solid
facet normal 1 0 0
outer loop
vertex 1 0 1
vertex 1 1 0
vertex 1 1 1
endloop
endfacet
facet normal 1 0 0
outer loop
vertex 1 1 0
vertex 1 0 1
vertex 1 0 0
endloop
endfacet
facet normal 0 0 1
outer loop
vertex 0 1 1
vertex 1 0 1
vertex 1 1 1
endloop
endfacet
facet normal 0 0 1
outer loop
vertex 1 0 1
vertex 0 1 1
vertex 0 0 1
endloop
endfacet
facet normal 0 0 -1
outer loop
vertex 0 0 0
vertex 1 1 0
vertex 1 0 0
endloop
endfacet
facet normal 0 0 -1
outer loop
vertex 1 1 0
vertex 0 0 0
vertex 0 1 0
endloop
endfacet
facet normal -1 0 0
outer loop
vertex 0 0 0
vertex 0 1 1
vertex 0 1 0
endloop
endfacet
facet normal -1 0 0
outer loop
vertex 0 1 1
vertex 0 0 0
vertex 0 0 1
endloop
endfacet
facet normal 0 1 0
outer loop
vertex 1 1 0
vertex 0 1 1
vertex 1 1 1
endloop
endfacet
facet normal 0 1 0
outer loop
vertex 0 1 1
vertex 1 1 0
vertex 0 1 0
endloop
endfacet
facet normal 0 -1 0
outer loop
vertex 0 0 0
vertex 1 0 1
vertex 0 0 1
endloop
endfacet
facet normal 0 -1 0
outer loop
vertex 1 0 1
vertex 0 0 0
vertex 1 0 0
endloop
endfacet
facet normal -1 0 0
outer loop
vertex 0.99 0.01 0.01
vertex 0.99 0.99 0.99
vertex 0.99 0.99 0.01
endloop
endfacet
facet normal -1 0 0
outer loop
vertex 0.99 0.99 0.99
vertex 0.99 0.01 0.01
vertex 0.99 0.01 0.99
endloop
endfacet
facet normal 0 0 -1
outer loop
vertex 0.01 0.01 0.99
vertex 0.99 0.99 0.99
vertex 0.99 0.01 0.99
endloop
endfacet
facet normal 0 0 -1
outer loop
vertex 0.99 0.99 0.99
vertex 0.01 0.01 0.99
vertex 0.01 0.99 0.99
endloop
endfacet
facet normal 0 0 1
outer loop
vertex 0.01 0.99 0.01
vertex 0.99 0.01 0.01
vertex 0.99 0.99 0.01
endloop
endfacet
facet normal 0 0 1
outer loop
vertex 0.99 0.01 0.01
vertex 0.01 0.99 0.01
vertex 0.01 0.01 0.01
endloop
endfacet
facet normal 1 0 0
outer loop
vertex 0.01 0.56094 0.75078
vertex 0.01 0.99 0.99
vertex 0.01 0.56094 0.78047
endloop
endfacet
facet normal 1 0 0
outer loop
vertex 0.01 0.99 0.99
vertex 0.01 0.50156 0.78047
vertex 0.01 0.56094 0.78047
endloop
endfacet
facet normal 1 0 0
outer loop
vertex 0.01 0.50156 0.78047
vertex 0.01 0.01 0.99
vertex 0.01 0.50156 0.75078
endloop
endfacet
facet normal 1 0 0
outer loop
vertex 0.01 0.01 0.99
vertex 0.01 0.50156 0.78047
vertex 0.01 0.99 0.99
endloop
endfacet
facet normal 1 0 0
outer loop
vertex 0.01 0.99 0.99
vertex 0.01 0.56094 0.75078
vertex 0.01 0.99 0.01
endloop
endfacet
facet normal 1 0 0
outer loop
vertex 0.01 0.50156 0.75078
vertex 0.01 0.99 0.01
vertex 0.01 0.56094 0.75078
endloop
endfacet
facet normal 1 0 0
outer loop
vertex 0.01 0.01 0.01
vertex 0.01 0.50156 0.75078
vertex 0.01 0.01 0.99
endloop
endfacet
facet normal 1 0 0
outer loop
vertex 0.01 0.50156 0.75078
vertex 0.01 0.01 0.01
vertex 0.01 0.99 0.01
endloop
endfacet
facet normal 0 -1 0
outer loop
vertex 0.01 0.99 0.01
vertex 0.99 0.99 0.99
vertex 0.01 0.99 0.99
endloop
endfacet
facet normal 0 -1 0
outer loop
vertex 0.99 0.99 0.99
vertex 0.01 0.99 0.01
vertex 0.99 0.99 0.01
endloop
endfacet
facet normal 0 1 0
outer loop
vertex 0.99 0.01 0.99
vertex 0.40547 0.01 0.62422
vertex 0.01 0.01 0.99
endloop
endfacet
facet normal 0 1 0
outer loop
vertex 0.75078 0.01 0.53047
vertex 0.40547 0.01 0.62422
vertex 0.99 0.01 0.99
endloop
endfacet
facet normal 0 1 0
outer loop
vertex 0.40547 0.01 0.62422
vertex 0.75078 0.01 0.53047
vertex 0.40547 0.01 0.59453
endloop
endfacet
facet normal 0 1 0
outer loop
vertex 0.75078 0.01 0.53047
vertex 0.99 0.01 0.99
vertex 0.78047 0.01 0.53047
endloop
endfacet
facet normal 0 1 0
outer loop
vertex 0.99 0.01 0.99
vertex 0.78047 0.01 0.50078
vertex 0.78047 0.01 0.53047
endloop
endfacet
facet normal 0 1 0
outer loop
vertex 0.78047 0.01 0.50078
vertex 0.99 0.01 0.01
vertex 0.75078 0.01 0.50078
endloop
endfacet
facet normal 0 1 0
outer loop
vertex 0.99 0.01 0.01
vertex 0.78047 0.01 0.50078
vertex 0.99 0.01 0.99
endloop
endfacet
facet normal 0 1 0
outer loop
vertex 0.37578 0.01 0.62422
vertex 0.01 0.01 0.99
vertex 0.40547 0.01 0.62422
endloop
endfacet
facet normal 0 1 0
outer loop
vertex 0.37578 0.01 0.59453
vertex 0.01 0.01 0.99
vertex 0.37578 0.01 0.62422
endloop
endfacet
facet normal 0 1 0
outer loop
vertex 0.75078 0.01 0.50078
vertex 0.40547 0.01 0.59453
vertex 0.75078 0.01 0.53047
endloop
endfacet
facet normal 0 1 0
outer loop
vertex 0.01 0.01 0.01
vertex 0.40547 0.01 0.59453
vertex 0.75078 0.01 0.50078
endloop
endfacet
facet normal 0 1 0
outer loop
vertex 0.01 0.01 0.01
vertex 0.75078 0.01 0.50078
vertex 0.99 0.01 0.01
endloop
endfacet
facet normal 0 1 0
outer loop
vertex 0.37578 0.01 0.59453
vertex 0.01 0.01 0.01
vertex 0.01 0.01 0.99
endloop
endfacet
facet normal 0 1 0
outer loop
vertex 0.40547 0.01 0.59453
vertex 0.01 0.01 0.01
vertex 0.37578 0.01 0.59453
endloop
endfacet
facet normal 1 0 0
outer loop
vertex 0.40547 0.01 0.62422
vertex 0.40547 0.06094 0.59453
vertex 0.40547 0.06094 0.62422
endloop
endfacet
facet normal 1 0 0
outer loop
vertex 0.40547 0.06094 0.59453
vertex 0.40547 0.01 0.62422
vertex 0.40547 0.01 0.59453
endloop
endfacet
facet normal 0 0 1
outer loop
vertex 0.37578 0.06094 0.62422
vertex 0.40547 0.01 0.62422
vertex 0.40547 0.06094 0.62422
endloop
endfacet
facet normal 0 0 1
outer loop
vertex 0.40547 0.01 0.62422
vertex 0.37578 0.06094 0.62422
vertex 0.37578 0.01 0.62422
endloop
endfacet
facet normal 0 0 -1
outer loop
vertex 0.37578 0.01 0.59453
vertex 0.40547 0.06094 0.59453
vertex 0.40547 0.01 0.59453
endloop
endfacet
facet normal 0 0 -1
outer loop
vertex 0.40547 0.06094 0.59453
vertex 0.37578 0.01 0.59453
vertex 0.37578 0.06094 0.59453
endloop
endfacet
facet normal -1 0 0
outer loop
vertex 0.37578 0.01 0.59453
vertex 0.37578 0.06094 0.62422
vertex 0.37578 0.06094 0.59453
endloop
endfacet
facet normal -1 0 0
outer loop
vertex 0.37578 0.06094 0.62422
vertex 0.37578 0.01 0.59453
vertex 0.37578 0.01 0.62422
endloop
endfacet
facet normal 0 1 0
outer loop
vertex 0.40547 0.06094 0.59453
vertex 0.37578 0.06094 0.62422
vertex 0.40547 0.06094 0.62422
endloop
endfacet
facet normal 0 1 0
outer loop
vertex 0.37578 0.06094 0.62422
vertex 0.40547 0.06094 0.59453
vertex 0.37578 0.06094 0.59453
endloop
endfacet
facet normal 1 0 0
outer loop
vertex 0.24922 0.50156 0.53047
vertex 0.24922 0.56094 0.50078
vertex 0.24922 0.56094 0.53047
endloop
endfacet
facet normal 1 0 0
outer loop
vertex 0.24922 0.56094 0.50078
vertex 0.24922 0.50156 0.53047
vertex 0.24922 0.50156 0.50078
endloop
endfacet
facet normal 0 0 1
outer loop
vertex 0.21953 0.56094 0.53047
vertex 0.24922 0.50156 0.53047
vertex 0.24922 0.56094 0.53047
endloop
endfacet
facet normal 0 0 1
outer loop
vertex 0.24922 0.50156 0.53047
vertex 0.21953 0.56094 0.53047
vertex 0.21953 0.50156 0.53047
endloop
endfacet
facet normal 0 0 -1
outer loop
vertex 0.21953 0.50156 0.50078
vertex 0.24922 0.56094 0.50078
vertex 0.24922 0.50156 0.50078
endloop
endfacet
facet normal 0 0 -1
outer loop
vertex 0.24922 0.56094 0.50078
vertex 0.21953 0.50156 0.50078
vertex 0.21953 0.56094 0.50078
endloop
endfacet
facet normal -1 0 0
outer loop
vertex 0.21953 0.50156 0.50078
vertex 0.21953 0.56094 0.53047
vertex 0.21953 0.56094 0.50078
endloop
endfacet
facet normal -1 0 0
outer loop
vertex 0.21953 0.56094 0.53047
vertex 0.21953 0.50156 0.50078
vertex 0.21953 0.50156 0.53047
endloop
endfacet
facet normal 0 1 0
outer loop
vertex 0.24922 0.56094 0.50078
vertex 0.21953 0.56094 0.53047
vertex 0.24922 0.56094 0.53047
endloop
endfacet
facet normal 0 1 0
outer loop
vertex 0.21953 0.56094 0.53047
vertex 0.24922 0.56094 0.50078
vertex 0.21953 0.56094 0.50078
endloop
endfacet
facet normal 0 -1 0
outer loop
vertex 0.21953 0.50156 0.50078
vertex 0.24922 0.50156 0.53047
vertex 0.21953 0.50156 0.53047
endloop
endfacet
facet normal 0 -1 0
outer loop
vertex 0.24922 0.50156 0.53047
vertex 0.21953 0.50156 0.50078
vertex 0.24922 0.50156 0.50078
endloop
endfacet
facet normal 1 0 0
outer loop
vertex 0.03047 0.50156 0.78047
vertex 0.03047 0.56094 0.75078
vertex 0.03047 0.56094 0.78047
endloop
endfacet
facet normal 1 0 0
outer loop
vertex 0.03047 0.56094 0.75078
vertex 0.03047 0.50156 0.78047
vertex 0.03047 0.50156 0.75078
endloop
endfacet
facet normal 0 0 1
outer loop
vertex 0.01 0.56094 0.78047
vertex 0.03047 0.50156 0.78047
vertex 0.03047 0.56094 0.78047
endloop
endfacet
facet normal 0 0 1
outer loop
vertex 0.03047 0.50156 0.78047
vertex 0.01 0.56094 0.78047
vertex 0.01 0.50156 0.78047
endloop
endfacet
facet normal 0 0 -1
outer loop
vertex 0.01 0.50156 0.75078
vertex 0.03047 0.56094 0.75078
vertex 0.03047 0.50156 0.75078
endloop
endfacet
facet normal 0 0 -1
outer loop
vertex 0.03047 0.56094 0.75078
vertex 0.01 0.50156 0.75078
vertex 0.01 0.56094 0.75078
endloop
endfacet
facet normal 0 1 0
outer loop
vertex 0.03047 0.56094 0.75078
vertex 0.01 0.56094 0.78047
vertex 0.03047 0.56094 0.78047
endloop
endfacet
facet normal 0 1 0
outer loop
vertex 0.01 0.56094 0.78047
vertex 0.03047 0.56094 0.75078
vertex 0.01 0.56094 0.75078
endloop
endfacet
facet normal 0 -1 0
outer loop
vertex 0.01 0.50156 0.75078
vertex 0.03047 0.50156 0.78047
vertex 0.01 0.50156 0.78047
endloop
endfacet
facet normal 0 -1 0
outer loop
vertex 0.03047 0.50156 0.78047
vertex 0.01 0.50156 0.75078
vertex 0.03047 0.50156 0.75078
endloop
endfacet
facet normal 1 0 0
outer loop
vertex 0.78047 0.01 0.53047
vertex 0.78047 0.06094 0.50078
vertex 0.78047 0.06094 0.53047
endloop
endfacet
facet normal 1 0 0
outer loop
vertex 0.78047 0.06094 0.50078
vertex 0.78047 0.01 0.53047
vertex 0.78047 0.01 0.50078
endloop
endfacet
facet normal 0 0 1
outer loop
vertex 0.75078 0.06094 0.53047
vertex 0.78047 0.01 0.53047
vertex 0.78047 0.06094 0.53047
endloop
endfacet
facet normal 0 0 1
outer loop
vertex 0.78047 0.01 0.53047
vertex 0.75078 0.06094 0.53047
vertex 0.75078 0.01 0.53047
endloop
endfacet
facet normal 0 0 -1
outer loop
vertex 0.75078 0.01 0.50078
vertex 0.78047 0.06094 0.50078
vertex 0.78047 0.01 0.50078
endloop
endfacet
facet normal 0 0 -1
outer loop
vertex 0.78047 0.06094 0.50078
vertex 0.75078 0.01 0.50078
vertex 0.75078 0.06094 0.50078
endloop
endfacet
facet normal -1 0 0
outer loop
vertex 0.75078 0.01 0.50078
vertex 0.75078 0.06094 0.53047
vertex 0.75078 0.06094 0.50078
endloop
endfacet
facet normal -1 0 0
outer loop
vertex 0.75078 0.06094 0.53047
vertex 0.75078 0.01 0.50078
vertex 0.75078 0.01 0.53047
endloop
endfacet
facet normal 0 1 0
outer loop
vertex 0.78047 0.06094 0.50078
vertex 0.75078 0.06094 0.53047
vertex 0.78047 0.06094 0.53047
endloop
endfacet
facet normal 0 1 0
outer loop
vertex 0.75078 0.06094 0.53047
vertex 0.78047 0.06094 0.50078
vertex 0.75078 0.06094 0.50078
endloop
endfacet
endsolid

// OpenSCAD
translate([0.390625, 0.03125, 0.609375]) color([0.6665075097113882, 0.5421139713900744, 0.6943978877819516]) cube([0.0296875, 0.059375, 0.0296875], center=true);
translate([0.234375, 0.53125, 0.515625]) color([0.9269770591996176, 0.12480324665016229, 0.8422397758241813]) cube([0.0296875, 0.059375, 0.0296875], center=true);
translate([0.015625, 0.53125, 0.765625]) color([0.028249143050612435, 0.8554899328562455, 0.6212809598996976]) cube([0.0296875, 0.059375, 0.0296875], center=true);
translate([0.765625, 0.03125, 0.515625]) color([0.6435486749275994, 0.4857227915978113, 0.2898251547629681]) cube([0.0296875, 0.059375, 0.0296875], center=true);
color([0.3,0.3,0.3,0.3]) difference() { cube([1,1,1]); translate([0.01,0.01,0.01]) cube([0.98,0.98,0.98]); }
